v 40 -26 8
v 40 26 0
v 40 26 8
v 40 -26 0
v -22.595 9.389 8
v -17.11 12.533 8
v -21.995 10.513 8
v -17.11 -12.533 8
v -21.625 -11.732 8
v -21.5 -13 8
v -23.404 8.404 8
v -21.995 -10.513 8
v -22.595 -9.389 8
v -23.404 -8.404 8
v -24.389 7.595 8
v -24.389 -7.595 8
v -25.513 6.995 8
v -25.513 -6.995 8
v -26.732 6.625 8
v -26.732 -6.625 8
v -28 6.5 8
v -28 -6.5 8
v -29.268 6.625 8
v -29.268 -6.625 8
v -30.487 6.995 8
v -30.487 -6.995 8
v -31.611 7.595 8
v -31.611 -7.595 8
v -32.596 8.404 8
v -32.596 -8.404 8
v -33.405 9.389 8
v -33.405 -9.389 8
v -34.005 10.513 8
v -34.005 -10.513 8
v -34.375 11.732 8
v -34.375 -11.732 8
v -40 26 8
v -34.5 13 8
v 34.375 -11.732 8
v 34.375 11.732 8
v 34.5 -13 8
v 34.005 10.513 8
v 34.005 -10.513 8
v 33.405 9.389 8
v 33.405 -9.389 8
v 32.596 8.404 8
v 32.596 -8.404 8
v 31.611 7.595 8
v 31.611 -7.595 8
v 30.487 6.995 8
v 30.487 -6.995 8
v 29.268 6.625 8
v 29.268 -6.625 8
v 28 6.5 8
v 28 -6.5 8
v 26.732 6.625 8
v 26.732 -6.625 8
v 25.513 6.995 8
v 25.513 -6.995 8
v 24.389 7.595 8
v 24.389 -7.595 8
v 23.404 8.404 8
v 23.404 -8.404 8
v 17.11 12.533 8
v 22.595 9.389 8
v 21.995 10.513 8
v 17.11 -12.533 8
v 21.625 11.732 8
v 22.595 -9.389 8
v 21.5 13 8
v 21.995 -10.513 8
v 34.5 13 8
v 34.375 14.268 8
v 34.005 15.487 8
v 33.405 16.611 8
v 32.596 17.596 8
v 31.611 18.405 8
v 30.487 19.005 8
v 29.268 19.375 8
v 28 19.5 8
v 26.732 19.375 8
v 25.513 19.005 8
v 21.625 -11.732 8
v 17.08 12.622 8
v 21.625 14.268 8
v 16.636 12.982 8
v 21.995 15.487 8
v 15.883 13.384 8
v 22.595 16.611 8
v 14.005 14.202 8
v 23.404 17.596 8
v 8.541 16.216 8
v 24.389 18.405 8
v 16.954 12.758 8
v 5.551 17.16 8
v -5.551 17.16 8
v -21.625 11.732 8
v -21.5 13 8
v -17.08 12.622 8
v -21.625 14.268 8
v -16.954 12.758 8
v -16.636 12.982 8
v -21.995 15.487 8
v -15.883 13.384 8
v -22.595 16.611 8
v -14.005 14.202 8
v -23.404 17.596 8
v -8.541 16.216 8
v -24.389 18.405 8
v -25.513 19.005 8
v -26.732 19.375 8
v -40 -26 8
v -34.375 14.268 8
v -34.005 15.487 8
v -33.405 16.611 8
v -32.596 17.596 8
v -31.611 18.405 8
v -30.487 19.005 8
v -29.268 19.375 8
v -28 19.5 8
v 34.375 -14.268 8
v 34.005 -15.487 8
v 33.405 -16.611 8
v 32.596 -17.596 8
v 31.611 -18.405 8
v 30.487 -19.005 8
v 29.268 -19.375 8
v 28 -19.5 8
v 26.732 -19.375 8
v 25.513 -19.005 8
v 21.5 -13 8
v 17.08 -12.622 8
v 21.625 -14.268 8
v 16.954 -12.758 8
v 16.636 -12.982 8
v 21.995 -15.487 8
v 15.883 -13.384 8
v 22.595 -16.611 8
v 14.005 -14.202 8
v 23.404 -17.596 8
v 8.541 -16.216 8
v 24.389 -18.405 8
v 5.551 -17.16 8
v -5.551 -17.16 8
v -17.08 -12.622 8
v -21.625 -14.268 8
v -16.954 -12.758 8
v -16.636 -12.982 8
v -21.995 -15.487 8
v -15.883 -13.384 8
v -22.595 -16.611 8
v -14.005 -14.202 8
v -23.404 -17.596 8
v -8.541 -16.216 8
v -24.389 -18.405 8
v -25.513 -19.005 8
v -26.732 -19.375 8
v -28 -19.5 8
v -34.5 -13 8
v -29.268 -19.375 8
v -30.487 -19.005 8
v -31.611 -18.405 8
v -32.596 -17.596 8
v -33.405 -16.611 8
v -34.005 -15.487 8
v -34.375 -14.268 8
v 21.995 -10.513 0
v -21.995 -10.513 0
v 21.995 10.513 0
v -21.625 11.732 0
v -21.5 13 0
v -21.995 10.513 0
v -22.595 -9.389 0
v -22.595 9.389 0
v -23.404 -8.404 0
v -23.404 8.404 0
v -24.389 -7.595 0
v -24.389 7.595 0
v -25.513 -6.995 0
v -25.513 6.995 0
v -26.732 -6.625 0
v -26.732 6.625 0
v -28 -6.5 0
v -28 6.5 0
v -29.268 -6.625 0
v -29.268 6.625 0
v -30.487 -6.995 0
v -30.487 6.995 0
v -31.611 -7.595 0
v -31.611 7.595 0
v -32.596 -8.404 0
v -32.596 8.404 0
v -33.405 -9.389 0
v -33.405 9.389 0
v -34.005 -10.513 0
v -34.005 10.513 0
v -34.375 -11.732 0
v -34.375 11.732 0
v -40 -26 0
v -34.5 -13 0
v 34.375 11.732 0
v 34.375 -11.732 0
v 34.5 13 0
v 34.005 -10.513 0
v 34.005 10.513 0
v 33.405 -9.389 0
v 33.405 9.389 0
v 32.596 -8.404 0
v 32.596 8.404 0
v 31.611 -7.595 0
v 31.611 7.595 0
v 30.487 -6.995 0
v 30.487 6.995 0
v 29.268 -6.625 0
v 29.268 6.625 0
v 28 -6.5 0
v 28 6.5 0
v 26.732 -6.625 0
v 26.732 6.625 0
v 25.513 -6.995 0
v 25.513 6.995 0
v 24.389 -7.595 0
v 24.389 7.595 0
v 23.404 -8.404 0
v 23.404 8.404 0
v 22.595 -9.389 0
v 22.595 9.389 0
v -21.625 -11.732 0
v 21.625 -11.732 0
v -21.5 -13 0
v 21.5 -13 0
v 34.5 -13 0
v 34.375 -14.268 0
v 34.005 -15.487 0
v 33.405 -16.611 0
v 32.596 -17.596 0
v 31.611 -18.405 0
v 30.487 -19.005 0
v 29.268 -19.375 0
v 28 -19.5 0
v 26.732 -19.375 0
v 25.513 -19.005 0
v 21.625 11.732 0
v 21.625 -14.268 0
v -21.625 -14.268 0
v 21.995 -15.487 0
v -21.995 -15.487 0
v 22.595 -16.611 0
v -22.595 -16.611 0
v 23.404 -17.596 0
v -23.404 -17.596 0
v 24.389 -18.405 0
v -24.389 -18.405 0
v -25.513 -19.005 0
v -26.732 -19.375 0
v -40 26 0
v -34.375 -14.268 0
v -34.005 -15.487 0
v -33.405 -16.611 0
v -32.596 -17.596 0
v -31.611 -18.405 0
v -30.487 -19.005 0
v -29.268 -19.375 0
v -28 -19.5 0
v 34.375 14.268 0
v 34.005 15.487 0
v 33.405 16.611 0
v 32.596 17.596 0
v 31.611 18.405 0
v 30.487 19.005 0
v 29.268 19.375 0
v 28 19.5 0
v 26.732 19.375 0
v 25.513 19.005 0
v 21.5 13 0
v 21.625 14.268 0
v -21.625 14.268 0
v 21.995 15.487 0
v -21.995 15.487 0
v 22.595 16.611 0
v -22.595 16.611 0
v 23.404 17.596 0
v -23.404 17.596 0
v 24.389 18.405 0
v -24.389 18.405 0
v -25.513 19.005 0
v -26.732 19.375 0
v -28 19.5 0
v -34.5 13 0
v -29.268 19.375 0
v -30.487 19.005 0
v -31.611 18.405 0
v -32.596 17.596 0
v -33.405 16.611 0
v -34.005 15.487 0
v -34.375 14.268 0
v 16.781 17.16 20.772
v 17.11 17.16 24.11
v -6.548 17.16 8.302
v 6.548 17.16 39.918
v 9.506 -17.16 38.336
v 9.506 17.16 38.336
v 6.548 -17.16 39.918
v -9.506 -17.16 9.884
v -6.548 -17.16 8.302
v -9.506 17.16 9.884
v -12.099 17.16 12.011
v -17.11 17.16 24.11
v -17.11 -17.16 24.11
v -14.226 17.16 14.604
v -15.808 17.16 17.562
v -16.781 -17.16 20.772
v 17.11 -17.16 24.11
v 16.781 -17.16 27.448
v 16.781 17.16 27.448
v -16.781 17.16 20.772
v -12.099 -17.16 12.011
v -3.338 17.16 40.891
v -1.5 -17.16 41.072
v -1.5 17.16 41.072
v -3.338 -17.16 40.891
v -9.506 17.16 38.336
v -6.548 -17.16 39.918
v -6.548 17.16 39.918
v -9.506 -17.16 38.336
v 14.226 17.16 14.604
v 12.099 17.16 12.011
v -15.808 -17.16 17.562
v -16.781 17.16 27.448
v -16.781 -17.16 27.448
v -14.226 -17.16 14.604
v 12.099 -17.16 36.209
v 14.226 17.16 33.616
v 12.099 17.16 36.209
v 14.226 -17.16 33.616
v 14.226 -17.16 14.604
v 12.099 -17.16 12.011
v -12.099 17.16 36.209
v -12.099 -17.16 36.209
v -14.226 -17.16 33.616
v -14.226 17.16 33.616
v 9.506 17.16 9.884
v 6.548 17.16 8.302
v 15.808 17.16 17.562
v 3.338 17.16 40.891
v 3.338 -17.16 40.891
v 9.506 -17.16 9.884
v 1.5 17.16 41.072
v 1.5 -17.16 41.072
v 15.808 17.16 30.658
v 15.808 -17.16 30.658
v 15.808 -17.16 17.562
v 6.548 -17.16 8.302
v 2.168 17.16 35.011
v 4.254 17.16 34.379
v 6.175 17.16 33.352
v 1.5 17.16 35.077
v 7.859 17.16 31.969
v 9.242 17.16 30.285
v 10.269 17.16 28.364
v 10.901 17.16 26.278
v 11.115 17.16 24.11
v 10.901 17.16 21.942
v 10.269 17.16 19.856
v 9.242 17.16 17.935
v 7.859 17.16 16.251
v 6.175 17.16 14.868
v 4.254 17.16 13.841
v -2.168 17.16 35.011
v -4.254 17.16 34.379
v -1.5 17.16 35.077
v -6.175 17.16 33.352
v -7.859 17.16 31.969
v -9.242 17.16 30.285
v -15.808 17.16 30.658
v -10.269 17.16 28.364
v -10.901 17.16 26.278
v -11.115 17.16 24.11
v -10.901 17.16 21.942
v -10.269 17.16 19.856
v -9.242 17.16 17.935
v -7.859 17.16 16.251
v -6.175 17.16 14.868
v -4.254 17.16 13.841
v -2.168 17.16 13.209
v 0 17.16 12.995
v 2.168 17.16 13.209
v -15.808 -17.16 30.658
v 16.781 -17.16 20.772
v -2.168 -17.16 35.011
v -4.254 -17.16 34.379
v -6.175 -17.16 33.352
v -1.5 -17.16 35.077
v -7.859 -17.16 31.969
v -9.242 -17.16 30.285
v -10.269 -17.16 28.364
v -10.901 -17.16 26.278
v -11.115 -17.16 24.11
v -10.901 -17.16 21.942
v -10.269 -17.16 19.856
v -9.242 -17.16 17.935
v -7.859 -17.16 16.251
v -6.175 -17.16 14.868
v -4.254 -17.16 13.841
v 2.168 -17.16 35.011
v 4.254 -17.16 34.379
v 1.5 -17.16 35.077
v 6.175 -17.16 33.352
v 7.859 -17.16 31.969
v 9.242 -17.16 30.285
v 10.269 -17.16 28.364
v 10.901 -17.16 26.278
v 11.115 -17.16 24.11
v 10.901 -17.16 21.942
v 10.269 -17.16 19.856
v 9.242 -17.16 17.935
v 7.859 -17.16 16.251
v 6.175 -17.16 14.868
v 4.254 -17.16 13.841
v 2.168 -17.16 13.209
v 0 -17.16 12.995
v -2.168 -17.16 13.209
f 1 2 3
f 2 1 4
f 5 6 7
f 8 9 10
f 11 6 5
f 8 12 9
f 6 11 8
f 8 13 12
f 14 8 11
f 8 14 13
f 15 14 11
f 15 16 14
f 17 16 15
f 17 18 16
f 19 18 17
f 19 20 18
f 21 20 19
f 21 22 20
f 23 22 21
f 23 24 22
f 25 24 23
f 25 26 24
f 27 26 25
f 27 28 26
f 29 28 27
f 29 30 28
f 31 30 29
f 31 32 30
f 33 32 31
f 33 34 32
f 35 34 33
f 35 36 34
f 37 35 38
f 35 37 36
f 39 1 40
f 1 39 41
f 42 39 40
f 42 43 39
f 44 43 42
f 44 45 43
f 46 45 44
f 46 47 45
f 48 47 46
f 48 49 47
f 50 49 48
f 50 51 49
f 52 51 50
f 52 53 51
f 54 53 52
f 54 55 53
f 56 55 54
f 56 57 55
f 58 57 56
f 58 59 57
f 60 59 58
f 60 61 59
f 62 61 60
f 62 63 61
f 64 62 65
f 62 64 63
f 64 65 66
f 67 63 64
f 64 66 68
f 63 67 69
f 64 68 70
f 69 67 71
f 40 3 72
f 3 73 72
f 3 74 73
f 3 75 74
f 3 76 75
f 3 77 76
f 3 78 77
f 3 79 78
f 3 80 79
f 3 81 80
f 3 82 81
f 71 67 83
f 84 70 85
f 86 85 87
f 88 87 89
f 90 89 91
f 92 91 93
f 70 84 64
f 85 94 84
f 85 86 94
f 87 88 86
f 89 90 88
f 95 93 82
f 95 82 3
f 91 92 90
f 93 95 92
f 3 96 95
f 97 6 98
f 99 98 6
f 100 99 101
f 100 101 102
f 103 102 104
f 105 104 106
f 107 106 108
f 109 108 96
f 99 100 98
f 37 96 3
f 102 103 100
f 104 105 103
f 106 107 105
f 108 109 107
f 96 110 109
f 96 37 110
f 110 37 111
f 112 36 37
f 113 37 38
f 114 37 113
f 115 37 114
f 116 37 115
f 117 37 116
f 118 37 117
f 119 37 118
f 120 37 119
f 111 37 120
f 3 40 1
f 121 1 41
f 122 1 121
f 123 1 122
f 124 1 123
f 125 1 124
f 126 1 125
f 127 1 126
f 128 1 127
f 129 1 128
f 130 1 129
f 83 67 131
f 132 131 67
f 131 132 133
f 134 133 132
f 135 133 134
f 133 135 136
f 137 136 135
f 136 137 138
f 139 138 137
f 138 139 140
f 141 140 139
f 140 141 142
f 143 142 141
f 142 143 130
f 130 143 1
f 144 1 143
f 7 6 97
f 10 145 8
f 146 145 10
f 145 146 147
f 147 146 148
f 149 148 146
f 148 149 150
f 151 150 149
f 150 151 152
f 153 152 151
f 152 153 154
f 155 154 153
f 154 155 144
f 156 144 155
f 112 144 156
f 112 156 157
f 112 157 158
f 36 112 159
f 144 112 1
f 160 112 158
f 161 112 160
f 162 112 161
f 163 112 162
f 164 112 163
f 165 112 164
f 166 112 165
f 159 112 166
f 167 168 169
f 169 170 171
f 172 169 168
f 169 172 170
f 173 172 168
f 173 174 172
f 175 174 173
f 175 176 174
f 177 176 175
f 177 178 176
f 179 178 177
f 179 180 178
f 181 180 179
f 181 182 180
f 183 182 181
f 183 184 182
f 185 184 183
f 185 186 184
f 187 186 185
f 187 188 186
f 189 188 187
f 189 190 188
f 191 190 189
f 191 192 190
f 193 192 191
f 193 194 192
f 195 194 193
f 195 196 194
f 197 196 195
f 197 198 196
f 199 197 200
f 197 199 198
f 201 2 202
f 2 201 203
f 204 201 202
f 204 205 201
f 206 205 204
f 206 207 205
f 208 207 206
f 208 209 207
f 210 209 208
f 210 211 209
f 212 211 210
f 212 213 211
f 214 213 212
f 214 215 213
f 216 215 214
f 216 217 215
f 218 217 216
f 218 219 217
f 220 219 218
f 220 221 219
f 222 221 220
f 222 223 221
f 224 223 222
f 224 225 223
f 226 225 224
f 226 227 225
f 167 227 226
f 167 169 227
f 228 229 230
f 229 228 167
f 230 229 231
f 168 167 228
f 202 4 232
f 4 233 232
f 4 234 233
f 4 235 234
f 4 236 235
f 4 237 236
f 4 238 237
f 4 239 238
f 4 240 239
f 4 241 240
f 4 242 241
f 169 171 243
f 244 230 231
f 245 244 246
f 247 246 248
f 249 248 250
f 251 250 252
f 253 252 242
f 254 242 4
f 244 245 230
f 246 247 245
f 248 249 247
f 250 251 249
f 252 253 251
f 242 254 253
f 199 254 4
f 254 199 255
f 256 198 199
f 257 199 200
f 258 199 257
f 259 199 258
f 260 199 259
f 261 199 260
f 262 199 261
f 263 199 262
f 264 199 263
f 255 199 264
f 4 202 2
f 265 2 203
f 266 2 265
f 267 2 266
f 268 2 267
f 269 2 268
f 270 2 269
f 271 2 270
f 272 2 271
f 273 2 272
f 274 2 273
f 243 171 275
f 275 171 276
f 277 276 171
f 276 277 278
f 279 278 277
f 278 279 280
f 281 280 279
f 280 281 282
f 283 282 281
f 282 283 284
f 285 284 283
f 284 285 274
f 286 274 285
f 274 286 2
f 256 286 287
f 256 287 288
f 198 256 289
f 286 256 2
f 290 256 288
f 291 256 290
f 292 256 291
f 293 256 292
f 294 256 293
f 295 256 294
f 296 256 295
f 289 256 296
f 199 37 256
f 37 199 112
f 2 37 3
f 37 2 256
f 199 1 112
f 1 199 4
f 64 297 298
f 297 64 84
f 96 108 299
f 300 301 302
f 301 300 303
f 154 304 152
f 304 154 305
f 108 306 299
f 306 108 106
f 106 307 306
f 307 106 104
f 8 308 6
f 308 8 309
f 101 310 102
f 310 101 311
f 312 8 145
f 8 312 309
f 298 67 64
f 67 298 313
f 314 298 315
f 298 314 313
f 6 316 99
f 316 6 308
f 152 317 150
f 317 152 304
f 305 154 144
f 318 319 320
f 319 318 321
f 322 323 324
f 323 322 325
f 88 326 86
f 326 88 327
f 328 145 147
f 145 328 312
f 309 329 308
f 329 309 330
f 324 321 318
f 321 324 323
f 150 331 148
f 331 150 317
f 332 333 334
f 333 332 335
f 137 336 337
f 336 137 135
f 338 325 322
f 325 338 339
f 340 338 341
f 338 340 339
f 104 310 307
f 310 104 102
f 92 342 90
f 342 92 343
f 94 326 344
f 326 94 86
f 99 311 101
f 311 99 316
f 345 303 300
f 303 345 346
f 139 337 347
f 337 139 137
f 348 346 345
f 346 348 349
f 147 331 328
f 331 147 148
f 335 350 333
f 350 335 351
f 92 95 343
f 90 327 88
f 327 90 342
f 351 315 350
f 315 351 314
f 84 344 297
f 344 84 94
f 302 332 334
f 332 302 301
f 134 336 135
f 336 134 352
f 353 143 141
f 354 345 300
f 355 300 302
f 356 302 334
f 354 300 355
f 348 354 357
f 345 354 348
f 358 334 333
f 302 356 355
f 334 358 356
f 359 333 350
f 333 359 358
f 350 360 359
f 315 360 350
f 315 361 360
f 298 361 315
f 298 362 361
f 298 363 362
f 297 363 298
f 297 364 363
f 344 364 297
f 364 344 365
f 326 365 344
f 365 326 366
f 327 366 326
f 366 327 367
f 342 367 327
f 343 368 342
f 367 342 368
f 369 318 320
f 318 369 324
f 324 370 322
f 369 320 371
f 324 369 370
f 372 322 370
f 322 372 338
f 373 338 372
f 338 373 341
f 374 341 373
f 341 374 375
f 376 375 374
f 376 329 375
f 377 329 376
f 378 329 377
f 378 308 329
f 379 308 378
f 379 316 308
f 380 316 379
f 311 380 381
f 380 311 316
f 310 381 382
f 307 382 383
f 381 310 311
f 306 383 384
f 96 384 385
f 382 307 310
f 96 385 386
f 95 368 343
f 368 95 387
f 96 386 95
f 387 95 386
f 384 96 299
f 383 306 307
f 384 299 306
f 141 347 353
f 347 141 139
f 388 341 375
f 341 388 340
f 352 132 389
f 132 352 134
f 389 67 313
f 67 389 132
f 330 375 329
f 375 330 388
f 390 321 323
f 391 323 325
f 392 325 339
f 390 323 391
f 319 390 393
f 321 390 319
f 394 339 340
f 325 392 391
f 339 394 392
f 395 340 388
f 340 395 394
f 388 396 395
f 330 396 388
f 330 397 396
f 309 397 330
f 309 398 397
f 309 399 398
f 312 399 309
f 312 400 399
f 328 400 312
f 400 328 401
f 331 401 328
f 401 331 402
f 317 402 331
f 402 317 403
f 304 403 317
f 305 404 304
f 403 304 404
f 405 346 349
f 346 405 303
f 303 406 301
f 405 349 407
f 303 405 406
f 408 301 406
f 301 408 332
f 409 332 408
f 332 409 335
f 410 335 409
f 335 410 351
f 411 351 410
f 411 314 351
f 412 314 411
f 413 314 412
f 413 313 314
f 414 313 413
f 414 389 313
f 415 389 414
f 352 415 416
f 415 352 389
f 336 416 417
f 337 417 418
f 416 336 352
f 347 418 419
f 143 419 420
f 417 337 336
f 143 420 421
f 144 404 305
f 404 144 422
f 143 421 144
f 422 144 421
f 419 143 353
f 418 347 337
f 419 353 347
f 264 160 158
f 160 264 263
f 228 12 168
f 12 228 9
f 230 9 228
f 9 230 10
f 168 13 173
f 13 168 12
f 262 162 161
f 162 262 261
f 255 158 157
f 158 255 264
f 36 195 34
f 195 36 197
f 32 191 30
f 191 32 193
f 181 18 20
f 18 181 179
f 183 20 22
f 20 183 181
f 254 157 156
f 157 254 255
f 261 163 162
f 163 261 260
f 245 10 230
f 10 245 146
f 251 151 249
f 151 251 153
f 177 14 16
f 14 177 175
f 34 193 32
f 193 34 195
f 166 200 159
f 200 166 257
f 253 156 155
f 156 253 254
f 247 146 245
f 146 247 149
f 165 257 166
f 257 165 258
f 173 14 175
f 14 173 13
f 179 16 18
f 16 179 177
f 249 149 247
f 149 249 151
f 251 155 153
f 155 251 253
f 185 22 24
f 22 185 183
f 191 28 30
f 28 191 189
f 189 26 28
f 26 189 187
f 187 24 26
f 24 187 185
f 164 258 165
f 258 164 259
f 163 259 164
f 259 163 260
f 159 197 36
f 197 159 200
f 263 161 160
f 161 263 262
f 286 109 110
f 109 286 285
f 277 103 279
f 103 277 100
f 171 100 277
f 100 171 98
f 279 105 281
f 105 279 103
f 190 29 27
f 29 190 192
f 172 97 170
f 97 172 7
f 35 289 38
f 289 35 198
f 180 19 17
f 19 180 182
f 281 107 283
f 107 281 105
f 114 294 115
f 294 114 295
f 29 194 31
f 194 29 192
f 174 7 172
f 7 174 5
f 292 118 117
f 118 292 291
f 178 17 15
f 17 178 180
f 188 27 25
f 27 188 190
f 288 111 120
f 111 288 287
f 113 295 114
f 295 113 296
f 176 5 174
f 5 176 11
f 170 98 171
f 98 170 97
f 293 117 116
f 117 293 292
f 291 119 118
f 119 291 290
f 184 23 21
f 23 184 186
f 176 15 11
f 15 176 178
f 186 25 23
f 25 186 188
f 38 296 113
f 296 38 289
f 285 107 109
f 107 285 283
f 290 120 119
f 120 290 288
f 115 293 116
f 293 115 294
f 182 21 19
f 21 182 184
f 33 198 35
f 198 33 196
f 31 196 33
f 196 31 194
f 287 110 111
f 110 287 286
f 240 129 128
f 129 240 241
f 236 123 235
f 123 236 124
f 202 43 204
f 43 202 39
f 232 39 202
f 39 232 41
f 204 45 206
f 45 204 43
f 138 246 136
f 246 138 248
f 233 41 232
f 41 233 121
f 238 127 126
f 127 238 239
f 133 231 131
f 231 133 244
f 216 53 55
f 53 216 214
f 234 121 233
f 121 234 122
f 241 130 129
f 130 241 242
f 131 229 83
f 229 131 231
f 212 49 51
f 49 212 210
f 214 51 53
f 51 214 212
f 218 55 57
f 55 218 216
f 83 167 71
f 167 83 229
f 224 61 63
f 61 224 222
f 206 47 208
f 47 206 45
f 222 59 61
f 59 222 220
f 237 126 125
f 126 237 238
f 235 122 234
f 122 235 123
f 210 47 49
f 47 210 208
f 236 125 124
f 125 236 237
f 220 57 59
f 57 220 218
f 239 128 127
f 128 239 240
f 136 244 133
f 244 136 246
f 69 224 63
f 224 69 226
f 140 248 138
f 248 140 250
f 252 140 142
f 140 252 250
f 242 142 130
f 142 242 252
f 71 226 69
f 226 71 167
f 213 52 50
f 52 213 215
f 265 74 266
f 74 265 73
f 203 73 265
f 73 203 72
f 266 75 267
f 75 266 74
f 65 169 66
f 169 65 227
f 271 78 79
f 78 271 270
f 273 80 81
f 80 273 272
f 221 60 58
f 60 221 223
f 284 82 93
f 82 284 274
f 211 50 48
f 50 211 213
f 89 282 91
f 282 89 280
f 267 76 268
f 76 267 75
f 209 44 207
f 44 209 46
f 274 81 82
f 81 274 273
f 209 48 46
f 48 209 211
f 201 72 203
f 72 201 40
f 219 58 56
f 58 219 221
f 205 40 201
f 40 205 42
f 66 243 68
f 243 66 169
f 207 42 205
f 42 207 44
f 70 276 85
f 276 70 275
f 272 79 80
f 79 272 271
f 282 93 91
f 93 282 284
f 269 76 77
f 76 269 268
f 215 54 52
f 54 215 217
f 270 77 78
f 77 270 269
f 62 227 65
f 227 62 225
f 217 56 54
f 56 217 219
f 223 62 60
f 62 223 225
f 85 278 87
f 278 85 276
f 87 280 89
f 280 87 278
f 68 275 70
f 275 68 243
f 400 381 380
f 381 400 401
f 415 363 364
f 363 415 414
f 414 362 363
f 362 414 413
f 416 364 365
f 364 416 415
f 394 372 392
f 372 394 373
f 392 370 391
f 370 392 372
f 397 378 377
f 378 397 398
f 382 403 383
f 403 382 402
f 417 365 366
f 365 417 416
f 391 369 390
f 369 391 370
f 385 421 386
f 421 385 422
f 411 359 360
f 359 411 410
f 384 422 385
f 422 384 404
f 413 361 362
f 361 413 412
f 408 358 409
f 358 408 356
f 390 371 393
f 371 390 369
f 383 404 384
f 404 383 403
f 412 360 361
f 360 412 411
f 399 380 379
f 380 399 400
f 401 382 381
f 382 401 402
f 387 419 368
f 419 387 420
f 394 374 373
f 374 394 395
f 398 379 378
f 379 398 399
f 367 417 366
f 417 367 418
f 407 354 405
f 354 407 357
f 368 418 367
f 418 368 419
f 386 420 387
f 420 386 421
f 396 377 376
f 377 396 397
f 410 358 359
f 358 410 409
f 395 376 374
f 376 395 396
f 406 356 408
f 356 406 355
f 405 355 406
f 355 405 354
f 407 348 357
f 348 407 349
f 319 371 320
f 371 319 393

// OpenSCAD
$fn = 32;

// ----------------------------------------------------------------------
// Bearing block: 80 x 52 mm base, 22.23 mm bore at 24.11 mm
// ----------------------------------------------------------------------

// --- parameters (mm) ---
base_w = 80;              // base width
base_d = 52;              // base depth
base_t = 8;               // base thickness
bore_d = 22.23;           // shaft / bearing bore
house_r = 17.11;          // housing outer radius
house_len = 34.32;        // housing length along the shaft
foot_w = 34.22;           // foot width under the housing
foot_len = 24.32;         // foot length along the shaft
axis_z = 24.11;           // bore axis height above the base
holes_d = 13;             // mounting holes
hole_x = 28;              // mounting hole spacing
groove_w = 3;             // oil groove width

difference() {
  union() {
    /* base plate with its underside on z = 0 */
    translate([0, 0, base_t / 2]) cube([base_w, base_d, base_t], center = true);
    /* hull foot: a straight web blending into the round housing */
    hull() {
      translate([0, 0, base_t - 0.5]) cube([foot_w, foot_len, 1.6], center = true);
      translate([0, 0, axis_z]) rotate([-90, 0, 0]) cylinder(h = house_len, d = 2 * house_r, center = true);
    }
  }
  /* bore through the housing, 2.5 mm clear on both sides */
  translate([0, 0, axis_z]) rotate([-90, 0, 0]) cylinder(h = house_len + 5, d = bore_d, center = true);
  /* oil groove from the top of the housing into the bore */
  translate([-groove_w / 2, -house_len / 2 - 2.5, axis_z + bore_d * 0.17]) cube([groove_w, house_len + 5, house_r + 5]);
  /* mounting holes through the base plate */
  for (hx = [-28, 28]) {
    for (hy = [-13, 13]) {
      translate([hx, hy, -2.5]) cylinder(h = base_t + 5, d = holes_d);
    }
  }
}
